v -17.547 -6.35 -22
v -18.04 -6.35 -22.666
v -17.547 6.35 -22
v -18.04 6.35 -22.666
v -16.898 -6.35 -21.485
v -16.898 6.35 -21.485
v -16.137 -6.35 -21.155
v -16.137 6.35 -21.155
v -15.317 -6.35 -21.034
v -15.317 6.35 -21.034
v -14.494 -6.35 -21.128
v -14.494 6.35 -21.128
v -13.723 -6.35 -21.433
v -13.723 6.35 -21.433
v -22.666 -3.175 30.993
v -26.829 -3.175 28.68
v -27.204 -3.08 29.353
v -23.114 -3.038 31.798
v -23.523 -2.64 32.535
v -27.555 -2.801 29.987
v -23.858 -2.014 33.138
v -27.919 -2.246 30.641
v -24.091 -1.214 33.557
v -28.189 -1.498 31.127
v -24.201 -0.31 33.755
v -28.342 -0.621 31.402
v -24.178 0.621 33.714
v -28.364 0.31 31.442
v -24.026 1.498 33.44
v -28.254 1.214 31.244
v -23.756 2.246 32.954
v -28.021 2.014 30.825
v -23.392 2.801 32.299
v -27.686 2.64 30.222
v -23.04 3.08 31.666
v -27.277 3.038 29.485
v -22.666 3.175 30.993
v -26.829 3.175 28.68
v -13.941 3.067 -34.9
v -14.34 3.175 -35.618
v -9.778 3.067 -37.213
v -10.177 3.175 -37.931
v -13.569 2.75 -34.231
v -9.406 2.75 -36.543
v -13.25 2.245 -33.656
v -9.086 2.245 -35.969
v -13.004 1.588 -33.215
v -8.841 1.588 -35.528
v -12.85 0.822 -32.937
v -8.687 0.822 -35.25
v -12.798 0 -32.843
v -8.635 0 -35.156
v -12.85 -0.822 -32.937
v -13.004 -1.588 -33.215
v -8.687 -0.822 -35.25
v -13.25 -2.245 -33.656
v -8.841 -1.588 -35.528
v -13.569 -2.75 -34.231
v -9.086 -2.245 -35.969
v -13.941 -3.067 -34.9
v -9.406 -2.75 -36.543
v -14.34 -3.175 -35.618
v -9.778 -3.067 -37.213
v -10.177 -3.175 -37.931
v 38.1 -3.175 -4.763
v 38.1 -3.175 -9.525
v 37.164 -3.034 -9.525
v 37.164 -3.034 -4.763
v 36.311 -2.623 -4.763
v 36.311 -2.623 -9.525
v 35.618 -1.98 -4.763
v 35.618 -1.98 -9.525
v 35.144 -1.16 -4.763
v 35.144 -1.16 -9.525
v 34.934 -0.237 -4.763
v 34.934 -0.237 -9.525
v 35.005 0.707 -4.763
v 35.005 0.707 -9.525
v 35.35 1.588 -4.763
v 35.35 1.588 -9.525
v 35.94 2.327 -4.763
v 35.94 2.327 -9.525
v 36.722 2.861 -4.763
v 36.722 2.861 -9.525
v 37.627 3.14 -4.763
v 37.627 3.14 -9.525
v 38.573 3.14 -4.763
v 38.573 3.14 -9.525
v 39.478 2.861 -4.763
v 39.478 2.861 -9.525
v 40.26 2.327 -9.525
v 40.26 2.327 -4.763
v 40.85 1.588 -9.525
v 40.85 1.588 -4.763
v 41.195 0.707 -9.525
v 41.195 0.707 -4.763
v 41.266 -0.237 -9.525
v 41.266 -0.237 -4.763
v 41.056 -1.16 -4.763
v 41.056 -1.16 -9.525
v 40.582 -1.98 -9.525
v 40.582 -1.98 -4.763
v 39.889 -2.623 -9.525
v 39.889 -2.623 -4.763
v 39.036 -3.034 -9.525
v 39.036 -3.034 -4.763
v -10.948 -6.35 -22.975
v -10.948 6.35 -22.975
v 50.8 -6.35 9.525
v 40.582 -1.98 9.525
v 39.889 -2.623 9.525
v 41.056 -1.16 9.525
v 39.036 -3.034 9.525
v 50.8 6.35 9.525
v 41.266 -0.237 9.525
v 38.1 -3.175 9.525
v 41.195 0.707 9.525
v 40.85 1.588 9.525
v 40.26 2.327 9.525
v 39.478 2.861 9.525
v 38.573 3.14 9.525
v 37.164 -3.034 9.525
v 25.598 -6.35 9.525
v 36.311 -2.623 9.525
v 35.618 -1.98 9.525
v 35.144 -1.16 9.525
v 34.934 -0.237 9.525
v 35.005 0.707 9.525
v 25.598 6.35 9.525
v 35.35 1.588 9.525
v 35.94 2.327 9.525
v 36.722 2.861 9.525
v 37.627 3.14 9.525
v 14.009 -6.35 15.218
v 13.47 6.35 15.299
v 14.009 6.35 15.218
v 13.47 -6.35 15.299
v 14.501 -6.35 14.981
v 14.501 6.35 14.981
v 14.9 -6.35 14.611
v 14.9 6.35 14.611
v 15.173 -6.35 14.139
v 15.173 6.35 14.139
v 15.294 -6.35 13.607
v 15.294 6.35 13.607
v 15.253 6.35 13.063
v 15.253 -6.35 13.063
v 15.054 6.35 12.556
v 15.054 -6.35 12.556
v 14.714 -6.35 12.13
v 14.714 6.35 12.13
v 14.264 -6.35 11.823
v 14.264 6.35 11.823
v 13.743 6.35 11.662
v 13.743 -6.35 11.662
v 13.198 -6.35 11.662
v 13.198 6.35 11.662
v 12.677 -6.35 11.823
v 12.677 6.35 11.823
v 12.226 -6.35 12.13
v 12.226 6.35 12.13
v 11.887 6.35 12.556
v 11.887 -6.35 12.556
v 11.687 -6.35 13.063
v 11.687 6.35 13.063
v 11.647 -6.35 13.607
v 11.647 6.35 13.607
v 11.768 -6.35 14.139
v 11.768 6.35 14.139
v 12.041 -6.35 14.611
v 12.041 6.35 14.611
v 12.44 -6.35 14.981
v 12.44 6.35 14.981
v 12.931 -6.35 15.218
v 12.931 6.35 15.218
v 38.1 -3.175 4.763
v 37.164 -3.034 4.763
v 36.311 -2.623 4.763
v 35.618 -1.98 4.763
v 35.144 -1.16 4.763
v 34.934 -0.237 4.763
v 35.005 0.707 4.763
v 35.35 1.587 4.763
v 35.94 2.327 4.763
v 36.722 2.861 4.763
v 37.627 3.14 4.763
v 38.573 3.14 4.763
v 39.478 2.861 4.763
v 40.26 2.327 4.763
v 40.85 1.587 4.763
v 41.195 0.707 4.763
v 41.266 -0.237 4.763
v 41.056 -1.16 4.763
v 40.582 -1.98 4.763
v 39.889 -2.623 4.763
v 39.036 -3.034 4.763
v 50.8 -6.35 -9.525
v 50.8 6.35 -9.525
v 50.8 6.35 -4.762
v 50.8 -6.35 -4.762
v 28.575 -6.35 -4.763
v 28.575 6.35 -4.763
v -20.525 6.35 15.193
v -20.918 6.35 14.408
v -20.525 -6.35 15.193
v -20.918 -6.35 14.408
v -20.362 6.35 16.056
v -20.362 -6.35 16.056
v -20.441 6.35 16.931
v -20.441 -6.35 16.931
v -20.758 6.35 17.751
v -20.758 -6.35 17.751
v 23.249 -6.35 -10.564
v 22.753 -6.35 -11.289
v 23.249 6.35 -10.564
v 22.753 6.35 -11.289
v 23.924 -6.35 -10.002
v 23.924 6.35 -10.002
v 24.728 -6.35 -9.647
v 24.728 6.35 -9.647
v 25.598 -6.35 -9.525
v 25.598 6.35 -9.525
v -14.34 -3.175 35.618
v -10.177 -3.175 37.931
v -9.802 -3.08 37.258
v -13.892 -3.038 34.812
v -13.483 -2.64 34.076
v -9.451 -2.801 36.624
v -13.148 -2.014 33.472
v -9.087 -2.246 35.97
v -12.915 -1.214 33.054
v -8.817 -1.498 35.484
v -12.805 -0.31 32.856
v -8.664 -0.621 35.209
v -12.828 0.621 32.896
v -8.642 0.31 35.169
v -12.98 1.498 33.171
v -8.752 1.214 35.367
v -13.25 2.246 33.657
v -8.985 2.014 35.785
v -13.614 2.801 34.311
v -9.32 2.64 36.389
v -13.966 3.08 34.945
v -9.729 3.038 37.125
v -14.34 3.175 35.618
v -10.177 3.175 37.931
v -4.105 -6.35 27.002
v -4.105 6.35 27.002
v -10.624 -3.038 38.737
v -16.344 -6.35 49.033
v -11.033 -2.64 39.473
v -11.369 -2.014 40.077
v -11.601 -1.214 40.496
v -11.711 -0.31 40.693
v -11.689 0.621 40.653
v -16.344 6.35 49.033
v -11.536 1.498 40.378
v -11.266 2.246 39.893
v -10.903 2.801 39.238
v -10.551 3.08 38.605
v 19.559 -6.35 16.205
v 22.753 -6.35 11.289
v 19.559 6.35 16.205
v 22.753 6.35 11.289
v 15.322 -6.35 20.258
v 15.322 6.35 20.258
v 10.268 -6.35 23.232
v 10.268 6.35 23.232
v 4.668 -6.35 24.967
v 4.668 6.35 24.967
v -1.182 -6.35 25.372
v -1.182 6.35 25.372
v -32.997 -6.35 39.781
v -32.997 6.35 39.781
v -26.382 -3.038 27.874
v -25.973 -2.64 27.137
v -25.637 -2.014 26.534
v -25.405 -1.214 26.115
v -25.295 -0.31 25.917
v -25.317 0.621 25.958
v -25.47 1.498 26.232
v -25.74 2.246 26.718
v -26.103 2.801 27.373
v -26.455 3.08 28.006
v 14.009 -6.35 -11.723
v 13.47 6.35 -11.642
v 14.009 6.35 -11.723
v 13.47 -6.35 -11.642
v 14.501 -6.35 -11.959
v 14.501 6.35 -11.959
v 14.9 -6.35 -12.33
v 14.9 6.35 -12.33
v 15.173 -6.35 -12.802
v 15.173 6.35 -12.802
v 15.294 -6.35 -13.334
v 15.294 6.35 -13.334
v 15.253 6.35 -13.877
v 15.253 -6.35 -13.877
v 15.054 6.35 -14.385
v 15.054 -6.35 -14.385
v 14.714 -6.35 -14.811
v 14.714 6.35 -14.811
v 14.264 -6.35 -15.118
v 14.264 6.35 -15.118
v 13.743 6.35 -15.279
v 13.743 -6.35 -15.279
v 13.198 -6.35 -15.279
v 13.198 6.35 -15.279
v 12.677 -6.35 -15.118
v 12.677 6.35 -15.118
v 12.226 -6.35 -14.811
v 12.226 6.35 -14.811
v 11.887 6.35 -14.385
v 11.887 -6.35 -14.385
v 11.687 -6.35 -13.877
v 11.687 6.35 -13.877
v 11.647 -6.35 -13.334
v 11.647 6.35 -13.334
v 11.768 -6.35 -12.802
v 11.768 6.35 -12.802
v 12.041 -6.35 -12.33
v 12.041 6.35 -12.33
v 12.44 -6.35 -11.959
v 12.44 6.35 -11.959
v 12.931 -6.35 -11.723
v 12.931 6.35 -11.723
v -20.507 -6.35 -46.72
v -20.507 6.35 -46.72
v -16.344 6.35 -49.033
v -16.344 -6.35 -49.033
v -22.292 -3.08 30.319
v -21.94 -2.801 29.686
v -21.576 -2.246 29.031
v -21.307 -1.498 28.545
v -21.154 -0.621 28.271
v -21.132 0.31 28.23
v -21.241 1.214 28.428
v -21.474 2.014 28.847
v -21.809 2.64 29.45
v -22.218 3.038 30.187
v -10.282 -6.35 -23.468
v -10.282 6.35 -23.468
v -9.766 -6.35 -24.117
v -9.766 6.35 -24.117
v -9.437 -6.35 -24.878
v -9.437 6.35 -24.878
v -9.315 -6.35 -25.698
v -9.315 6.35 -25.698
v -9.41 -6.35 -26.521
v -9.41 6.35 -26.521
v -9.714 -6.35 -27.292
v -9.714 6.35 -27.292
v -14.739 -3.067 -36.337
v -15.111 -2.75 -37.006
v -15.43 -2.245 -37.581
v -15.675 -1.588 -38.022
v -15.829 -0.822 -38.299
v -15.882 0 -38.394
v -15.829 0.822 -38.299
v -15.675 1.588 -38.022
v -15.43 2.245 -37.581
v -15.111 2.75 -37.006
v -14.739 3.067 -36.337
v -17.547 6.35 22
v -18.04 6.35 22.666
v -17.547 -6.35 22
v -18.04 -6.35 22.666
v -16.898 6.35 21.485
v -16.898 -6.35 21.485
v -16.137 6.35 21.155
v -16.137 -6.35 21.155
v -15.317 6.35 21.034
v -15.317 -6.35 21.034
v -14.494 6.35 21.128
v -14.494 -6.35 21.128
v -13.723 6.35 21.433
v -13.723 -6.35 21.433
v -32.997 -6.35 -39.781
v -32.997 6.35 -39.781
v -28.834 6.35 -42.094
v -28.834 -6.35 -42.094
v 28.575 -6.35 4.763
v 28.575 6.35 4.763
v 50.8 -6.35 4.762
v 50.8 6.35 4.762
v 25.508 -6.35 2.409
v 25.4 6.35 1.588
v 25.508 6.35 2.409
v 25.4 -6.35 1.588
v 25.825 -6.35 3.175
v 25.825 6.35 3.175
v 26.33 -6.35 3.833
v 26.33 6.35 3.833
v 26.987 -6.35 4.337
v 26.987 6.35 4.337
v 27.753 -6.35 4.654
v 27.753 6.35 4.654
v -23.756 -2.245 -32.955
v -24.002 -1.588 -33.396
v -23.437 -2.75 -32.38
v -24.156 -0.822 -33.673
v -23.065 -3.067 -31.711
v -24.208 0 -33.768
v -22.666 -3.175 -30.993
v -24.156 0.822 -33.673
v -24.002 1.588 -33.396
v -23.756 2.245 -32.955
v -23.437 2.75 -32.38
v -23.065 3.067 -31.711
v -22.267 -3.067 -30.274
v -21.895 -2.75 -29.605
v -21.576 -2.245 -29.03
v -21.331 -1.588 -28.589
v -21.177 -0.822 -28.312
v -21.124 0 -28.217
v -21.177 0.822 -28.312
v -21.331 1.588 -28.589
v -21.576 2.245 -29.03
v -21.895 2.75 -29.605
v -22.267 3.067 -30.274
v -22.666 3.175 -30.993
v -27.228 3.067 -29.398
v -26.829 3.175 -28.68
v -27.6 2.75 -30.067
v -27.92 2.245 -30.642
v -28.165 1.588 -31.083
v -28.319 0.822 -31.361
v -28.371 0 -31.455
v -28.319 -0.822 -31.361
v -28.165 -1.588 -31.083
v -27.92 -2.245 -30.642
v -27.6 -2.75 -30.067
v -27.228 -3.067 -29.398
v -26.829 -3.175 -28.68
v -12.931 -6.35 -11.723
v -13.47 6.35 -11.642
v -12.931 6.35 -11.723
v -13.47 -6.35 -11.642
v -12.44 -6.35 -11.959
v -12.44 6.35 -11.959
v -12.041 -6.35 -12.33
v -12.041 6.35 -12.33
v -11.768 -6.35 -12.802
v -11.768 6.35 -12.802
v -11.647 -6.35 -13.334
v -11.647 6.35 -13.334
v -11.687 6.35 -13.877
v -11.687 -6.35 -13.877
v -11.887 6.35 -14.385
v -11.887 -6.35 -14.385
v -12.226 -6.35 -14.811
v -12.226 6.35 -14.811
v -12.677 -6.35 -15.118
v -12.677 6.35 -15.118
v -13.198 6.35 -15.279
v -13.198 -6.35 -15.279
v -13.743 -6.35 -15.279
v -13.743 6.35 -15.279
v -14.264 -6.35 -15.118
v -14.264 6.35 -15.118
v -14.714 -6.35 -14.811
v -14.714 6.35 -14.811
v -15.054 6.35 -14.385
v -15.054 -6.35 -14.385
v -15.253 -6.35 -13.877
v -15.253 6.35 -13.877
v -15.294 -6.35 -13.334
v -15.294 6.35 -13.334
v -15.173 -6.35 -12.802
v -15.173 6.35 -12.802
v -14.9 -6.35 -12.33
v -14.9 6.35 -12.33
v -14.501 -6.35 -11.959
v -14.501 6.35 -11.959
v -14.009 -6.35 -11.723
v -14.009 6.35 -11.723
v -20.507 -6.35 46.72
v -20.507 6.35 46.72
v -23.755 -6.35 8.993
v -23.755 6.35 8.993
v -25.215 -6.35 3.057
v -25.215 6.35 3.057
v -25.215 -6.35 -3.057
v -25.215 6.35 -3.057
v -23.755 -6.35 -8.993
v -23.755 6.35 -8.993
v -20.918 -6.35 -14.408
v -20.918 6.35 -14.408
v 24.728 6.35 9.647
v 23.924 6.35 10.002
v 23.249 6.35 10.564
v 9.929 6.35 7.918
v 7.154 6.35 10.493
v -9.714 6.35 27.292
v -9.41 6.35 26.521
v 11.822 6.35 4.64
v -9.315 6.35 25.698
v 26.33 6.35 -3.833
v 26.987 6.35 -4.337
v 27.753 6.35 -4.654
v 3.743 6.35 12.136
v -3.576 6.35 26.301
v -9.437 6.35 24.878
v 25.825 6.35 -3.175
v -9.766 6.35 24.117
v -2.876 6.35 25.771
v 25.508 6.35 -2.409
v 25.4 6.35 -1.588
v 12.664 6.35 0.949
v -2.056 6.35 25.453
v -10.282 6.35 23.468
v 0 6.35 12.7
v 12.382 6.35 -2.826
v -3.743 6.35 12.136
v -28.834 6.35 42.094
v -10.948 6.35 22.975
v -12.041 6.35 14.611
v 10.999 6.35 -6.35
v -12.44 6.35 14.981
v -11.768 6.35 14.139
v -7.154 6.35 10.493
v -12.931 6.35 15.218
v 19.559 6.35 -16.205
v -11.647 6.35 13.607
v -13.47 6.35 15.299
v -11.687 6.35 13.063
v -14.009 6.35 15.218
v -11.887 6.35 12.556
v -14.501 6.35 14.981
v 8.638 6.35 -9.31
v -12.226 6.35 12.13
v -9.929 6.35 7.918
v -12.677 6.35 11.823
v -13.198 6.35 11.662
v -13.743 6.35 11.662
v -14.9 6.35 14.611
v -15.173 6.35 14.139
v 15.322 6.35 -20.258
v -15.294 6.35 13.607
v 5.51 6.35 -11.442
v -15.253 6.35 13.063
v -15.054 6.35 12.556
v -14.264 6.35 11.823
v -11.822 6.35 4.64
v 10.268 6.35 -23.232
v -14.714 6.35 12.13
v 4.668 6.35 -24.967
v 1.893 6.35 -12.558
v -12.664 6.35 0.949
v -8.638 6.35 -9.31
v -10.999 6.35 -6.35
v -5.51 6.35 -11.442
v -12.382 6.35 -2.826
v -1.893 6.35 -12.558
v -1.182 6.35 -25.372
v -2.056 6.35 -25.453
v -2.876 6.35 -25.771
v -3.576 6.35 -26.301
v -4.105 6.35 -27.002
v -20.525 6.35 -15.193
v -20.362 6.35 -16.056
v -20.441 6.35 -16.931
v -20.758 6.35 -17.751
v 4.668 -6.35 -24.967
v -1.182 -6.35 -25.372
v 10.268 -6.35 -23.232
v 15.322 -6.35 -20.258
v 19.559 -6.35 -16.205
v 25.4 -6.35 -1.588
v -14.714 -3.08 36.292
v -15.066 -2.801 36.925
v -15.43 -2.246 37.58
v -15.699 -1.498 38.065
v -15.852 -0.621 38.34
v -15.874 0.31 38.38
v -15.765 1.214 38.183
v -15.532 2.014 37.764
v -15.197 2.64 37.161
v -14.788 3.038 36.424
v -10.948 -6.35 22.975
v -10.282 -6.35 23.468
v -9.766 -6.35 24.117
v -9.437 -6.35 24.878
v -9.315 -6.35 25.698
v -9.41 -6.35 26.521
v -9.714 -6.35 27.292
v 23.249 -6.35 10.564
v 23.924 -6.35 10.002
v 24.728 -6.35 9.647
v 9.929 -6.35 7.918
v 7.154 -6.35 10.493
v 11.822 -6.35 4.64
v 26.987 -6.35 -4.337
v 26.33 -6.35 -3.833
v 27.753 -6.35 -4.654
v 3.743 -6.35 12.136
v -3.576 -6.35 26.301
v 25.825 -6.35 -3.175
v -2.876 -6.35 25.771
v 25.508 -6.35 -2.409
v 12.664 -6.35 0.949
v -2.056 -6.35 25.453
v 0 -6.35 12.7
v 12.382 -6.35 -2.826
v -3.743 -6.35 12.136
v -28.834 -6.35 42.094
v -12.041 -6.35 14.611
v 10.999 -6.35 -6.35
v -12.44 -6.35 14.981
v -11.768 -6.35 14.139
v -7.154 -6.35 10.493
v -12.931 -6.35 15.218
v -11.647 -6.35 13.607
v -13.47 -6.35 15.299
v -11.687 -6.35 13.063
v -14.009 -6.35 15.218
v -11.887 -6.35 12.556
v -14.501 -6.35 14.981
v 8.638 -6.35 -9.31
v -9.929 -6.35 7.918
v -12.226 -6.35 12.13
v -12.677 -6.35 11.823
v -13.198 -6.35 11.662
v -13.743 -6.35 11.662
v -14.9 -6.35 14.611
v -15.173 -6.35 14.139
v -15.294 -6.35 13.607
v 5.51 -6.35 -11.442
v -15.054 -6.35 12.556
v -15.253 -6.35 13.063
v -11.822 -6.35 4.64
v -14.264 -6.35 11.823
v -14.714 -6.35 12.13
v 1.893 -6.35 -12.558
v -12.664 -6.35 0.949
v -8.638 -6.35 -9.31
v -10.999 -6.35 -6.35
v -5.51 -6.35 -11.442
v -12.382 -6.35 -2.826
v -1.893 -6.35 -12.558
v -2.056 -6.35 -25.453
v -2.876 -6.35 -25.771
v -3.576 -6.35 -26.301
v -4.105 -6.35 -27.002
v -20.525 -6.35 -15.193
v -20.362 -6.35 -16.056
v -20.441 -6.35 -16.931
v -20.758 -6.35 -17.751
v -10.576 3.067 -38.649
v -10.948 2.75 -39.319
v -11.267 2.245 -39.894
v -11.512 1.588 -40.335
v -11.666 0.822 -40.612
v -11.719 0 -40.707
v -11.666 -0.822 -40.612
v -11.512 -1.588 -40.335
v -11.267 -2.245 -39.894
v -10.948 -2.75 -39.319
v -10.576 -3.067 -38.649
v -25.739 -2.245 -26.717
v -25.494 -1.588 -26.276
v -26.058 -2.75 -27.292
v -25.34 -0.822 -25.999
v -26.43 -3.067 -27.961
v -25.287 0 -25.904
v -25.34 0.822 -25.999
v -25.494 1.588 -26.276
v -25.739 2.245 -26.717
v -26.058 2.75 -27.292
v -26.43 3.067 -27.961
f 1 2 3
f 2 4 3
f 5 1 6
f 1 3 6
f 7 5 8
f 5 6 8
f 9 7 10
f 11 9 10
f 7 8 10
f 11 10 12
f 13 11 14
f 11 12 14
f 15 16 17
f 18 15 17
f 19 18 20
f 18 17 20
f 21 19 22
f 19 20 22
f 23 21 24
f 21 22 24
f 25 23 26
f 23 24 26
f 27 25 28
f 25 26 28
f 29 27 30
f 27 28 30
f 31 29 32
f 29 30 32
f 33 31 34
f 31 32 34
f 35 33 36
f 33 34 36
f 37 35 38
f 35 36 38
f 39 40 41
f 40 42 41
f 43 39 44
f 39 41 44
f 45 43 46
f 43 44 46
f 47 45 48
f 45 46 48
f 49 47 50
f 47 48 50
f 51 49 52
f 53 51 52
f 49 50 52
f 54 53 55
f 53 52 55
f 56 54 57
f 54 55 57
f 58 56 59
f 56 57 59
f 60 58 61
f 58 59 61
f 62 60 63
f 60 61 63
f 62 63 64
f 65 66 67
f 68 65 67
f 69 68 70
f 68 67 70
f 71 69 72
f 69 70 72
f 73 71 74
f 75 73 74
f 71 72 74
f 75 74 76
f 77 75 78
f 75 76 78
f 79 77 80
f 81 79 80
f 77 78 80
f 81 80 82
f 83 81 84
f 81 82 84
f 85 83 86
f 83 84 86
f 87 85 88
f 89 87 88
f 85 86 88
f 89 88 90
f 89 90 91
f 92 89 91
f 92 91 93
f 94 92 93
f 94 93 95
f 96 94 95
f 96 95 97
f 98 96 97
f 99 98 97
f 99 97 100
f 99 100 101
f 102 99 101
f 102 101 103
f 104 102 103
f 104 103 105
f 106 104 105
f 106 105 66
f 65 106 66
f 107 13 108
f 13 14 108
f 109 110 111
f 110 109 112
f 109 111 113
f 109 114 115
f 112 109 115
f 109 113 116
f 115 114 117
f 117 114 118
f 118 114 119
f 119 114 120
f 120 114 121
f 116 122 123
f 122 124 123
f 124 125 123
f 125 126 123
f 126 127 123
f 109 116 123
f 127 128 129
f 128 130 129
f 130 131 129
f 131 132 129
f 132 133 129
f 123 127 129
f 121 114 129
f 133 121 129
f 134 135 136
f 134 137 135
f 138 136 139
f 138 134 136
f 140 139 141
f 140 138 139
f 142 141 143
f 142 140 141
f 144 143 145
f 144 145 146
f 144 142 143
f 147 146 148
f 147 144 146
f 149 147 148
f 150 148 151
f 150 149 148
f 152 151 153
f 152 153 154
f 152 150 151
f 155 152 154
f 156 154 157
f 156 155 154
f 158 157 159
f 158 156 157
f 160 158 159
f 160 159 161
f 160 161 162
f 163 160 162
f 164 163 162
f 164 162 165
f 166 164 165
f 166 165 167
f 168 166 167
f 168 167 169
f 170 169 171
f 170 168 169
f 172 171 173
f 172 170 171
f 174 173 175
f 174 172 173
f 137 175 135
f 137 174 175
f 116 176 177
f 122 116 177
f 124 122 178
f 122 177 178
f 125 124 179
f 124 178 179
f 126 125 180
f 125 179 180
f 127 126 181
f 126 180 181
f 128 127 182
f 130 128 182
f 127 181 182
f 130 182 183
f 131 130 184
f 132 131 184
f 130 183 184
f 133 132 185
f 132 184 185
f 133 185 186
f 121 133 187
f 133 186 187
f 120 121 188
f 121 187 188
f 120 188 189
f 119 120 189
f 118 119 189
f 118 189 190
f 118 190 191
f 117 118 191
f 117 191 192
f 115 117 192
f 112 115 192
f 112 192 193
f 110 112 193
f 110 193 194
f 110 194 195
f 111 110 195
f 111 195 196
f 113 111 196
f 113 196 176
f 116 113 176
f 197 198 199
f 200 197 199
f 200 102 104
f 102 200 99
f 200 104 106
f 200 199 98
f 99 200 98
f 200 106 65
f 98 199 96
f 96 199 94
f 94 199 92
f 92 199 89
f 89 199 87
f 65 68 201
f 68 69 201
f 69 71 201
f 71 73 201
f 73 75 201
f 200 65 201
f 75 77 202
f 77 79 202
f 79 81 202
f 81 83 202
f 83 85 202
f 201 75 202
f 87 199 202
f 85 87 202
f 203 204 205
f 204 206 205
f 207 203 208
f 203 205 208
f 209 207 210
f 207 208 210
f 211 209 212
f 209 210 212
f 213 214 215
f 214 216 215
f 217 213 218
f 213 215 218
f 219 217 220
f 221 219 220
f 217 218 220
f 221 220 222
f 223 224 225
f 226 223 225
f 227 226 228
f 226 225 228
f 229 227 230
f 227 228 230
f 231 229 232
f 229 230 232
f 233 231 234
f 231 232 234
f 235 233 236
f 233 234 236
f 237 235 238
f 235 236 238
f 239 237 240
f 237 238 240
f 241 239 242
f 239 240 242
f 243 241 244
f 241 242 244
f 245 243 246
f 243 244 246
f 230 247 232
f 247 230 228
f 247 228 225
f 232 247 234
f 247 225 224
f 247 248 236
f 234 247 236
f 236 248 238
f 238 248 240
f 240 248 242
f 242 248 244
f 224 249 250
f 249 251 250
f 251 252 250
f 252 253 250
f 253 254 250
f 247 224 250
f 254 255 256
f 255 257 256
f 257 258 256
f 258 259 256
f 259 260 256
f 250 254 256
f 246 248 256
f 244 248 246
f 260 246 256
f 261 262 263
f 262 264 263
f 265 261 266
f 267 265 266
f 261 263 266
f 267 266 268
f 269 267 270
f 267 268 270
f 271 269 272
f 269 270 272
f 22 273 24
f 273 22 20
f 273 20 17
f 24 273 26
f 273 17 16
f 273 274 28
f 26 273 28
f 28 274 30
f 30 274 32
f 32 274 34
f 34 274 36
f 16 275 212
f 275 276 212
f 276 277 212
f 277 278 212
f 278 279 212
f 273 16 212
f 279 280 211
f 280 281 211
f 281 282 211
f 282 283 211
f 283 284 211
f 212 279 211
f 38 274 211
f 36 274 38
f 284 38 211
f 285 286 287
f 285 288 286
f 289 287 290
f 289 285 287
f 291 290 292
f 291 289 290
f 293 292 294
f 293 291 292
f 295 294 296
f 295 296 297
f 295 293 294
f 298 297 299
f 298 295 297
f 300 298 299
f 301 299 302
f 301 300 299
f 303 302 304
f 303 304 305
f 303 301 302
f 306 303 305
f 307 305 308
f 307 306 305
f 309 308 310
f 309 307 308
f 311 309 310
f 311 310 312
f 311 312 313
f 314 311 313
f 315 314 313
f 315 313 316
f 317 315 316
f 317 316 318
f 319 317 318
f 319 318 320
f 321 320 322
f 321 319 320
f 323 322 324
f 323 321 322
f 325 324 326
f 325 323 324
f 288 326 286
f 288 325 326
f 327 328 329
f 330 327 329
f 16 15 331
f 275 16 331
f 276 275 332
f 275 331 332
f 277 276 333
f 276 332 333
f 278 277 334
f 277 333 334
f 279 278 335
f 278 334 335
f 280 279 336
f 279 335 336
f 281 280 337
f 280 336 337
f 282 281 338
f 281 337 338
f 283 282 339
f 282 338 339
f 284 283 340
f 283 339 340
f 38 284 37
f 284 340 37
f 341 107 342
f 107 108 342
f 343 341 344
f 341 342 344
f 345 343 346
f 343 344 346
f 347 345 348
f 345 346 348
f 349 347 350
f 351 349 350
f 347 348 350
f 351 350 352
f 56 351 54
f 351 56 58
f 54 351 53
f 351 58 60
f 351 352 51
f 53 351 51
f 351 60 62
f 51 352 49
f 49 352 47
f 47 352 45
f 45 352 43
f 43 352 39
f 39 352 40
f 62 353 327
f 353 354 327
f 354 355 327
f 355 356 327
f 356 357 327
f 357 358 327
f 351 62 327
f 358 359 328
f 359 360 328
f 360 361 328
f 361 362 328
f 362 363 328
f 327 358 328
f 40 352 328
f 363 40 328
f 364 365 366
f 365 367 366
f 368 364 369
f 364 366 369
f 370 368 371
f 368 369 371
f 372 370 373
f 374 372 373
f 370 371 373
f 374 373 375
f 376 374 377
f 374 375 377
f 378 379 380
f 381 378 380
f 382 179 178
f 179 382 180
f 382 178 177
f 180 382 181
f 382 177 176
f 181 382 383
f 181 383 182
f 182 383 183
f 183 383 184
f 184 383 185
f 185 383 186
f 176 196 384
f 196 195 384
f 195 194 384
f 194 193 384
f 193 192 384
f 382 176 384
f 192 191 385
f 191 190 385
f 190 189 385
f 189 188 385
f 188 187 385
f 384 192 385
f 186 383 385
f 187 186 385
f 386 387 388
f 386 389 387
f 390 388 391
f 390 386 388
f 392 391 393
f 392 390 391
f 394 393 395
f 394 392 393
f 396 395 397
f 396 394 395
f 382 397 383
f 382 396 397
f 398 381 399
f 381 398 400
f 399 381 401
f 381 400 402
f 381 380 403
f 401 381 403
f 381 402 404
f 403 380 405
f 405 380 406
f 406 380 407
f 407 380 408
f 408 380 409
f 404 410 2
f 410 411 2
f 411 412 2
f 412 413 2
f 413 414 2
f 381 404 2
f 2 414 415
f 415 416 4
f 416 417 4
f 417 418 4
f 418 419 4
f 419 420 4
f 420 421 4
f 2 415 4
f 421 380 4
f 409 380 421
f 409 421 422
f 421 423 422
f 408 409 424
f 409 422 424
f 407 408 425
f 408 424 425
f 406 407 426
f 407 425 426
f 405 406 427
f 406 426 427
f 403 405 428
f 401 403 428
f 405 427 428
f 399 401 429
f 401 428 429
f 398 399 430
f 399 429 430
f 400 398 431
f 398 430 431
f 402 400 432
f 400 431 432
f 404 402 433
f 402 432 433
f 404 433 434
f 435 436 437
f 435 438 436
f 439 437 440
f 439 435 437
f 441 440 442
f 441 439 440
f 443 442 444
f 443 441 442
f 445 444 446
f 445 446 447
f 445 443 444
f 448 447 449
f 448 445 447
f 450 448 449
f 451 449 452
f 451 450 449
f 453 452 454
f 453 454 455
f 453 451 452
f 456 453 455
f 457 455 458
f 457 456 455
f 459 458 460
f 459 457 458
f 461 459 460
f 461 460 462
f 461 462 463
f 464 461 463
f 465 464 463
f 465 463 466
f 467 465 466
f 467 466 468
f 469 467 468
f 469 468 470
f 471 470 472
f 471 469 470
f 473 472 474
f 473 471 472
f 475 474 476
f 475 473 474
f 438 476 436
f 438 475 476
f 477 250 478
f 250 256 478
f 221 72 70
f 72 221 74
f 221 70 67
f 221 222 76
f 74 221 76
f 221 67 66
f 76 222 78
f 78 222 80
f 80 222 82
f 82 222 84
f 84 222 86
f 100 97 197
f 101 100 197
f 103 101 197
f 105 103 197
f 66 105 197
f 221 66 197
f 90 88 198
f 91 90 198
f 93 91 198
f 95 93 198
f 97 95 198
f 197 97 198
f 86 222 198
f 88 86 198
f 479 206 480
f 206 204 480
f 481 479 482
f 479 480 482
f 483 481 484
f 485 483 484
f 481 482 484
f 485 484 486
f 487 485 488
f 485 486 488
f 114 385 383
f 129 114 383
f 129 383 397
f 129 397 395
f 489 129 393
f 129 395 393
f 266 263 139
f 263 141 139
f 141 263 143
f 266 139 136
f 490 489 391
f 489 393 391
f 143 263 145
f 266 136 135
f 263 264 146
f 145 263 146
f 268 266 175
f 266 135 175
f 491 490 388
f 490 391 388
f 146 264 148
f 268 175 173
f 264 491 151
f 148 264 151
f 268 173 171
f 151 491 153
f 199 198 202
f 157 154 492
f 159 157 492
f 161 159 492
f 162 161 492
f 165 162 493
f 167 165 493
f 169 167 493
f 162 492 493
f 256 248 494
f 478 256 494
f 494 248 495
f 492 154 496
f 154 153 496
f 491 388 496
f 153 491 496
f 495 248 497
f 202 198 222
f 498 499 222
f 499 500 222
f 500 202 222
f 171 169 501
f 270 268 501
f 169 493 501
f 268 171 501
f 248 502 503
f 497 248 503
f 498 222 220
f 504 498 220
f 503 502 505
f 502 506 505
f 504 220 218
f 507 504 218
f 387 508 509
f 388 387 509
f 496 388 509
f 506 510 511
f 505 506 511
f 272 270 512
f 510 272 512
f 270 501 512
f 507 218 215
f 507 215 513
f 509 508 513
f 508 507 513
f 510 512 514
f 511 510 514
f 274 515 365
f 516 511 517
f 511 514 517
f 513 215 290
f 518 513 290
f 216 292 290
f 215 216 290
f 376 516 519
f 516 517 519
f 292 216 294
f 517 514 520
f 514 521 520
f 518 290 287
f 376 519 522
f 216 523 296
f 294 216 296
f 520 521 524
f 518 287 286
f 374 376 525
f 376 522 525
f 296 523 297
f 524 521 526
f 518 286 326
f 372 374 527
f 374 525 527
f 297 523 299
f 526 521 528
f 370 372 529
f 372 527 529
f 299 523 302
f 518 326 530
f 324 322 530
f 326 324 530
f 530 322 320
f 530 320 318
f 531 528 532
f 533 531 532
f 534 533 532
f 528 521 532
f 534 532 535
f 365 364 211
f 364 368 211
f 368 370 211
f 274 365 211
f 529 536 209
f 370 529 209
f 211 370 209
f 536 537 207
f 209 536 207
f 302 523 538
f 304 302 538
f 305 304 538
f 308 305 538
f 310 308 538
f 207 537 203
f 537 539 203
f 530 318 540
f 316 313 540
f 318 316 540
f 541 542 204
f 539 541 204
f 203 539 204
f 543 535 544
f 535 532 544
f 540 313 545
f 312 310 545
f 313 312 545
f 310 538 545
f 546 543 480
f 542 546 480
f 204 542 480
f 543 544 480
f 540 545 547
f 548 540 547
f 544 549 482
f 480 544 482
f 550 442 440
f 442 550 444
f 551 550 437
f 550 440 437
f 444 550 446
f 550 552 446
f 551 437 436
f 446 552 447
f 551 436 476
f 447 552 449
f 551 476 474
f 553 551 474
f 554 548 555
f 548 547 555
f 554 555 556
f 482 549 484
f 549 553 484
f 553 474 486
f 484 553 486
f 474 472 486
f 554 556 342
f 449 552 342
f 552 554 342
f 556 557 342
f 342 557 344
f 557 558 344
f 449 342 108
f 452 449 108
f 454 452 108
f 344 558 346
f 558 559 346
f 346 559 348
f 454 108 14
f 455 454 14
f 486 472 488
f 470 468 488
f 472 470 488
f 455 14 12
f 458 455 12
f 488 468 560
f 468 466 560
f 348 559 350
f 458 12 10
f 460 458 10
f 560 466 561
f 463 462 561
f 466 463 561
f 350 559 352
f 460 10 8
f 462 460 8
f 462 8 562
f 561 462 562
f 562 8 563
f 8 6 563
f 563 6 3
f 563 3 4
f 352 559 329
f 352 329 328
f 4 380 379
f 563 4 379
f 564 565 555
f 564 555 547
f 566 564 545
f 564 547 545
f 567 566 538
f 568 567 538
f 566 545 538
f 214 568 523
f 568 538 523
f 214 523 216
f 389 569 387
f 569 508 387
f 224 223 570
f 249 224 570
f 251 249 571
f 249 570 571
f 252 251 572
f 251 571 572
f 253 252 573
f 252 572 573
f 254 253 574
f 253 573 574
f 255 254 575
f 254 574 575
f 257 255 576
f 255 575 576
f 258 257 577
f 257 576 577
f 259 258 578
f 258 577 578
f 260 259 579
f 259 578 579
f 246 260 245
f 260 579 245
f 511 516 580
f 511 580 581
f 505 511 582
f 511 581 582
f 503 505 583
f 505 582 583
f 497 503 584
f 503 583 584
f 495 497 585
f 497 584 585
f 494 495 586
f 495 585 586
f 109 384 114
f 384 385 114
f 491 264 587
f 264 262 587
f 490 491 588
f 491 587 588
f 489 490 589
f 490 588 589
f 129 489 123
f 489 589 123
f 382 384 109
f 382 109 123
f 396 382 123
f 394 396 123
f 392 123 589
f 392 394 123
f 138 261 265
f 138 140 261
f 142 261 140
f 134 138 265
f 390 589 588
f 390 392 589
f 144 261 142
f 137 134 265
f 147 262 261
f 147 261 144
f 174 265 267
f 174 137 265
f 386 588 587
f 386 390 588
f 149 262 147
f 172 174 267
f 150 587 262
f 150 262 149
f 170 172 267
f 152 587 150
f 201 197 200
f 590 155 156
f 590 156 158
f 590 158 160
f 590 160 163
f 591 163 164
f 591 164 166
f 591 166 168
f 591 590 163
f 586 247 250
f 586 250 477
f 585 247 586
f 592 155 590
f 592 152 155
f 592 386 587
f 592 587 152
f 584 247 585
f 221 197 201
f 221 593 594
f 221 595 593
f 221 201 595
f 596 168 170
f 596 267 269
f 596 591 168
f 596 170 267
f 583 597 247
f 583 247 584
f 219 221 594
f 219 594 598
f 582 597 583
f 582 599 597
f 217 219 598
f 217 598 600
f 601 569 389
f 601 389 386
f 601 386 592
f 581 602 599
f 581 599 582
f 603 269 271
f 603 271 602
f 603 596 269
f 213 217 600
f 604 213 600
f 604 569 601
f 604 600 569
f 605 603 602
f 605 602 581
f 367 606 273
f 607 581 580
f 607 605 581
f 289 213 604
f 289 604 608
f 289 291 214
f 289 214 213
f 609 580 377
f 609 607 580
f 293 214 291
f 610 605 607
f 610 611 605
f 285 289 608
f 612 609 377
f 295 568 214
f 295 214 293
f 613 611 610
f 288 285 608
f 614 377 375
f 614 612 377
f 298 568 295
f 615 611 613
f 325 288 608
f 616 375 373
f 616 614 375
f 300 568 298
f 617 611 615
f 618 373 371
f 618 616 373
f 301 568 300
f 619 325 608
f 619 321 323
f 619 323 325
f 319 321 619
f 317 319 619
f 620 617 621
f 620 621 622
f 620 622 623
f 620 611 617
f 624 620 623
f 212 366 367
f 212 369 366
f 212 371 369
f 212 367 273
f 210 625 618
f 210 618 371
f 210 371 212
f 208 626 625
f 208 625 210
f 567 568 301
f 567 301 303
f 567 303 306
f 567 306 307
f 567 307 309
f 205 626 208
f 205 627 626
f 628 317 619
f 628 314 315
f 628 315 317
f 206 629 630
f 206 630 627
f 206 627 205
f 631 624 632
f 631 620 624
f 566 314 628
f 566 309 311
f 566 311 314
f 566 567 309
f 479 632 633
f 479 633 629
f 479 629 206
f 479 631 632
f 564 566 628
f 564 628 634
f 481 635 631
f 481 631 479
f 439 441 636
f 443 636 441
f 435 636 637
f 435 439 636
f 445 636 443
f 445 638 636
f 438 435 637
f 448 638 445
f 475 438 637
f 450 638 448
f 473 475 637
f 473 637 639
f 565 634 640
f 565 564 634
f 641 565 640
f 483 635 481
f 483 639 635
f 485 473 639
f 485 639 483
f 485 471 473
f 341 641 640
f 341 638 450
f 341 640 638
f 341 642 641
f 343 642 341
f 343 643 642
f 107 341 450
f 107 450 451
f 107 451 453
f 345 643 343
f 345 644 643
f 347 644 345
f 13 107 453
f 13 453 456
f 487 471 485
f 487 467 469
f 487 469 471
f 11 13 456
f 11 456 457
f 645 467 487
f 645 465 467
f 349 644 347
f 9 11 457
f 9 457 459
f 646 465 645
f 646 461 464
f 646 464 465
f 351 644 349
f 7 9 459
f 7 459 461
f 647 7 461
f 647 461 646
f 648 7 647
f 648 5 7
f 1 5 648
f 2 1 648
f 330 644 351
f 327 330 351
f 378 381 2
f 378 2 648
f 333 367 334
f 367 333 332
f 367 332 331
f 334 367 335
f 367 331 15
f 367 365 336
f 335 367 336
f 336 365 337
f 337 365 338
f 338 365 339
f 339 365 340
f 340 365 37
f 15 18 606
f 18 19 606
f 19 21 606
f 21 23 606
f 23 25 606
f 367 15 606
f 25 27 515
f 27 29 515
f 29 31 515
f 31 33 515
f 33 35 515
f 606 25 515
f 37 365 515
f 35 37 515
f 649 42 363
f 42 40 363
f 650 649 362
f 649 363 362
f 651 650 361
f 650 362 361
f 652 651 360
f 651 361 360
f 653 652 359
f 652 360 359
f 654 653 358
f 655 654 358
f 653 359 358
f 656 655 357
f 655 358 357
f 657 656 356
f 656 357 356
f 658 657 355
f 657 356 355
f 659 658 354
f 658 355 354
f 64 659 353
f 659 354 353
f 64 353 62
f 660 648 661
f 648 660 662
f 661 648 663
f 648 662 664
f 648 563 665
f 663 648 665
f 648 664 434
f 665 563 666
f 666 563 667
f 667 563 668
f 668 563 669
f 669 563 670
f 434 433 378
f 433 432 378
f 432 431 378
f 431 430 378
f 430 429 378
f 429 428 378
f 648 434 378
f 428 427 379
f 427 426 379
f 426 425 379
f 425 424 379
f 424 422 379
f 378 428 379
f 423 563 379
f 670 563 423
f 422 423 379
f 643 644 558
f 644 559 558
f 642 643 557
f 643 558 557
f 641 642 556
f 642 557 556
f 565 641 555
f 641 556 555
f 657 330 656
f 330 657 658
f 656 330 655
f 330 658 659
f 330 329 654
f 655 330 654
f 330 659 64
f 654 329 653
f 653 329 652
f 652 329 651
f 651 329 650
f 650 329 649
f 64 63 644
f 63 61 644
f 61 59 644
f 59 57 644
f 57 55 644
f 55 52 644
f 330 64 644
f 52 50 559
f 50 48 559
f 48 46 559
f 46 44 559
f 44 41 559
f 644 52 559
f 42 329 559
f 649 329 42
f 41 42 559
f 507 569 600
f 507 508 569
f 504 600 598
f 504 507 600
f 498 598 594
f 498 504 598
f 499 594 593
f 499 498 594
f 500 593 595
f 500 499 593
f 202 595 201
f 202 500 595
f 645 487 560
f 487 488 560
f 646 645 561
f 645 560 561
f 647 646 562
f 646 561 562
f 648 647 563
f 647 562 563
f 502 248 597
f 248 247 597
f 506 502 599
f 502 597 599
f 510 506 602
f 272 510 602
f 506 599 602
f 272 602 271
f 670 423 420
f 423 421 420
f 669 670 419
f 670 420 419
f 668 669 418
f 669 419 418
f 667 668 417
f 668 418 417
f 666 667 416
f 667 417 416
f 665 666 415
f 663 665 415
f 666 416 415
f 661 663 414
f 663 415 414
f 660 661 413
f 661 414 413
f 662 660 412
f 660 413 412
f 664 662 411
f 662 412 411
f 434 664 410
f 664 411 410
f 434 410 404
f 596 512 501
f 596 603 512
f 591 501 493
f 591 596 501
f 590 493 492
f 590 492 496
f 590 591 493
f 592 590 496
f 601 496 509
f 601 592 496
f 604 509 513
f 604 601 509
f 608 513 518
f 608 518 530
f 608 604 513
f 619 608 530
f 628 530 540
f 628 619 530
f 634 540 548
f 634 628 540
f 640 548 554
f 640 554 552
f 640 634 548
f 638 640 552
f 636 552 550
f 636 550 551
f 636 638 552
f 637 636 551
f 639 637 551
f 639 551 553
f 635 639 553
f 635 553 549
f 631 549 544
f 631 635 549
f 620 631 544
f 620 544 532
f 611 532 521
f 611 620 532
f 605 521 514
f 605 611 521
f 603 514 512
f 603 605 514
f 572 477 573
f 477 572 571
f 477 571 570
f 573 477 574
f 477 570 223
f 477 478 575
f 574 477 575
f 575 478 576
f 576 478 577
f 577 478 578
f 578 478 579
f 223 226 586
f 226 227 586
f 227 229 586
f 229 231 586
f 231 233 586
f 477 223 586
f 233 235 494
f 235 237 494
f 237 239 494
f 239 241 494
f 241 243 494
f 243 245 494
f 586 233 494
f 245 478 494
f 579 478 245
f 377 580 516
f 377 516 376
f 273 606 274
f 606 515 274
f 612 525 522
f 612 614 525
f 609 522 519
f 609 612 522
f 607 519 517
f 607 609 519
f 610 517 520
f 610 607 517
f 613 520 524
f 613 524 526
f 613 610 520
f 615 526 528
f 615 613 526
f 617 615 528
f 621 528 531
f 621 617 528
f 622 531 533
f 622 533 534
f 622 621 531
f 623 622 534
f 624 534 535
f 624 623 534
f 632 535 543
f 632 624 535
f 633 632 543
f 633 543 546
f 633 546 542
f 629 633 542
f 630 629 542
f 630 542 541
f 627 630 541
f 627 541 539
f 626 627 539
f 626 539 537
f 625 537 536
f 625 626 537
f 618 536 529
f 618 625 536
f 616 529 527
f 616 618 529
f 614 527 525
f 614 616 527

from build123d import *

# Parameters (mm, degrees)
SKETCH1_R                             = 12.7
SKETCH1_R_2                           = 1.8288
BOSS_EXTRUDE1_DEPTH                   = 6.35
F_1_4_0_25_DIAMETER_HOLE1_D           = 6.35
F_1_4_0_25_DIAMETER_HOLE1_ON_FACE_2_D = 6.35
F_1_4_0_25_DIAMETER_HOLE1_ON_FACE_3_D = 6.35
F_1_4_0_25_DIAMETER_HOLE1_ON_FACE_4_D = 6.35
F_1_4_0_25_DIAMETER_HOLE1_ON_FACE_5_D = 6.35
F_1_4_0_25_DIAMETER_HOLE1_ON_FACE_6_D = 6.35
FILLET1_R                             = 3.175


with BuildPart() as part:
    # Sketch1 → Boss-Extrude1 (new, symmetric)
    with BuildSketch(Plane(origin=(0, 0, 0), x_dir=(1, 0, 0), z_dir=(0, 1, 0))):
        with BuildLine():
            Line((25.4, 4.7625), (25.4, -4.7625))
            Line((25.4, -4.7625), (50.8, -4.7625))
            Line((50.8, -4.7625), (50.8, -9.525))
            Line((50.8, -9.525), (23.546430197, -9.525))
            ThreePointArc((23.546430197, -9.525), (12.881044339, -21.891521115), (-3.108809324, -25.209032202))
            Line((-3.108809324, -25.209032202), (-16.344312849, -49.032938546))
            Line((-16.344312849, -49.032938546), (-20.507486876, -46.720064087))
            Line((-20.507486876, -46.720064087), (-8.172156424, -24.516469273))
            Line((-8.172156424, -24.516469273), (-16.498504479, -19.890720354))
            Line((-16.498504479, -19.890720354), (-28.833834931, -42.094315167))
            Line((-28.833834931, -42.094315167), (-32.997008959, -39.781440707))
            Line((-32.997008959, -39.781440707), (-19.761505434, -15.957534364))
            ThreePointArc((-19.761505434, -15.957534364), (-25.4, 0), (-19.761505434, 15.957534364))
            Line((-19.761505434, 15.957534364), (-32.997008959, 39.781440707))
            Line((-32.997008959, 39.781440707), (-28.833834931, 42.094315167))
            Line((-28.833834931, 42.094315167), (-16.498504479, 19.890720354))
            Line((-16.498504479, 19.890720354), (-8.172156424, 24.516469273))
            Line((-8.172156424, 24.516469273), (-20.507486876, 46.720064087))
            Line((-20.507486876, 46.720064087), (-16.344312849, 49.032938546))
            Line((-16.344312849, 49.032938546), (-3.108809324, 25.209032202))
            ThreePointArc((-3.108809324, 25.209032202), (12.881044339, 21.891521115), (23.546430197, 9.525))
            Line((23.546430197, 9.525), (50.8, 9.525))
            Line((50.8, 9.525), (50.8, 4.7625))
            Line((50.8, 4.7625), (25.4, 4.7625))
        make_face()
        with Locations(Location((0, 0, 0), (0, 0, 270))):
            Circle(SKETCH1_R, mode=Mode.SUBTRACT)
        with Locations(Location((-13.470384182, 13.470384182, 0), (0, 0, 270))):
            Circle(SKETCH1_R_2, mode=Mode.SUBTRACT)
        with Locations(Location((13.470384182, 13.470384182, 0), (0, 0, 270))):
            Circle(SKETCH1_R_2, mode=Mode.SUBTRACT)
        with Locations(Location((13.470384182, -13.470384182, 0), (0, 0, 270))):
            Circle(SKETCH1_R_2, mode=Mode.SUBTRACT)
        with Locations(Location((-13.470384182, -13.470384182, 0), (0, 0, 270))):
            Circle(SKETCH1_R_2, mode=Mode.SUBTRACT)
    extrude(amount=BOSS_EXTRUDE1_DEPTH, both=True)

    # 1/4 (0.25) Diameter Hole1 (through all)
    with Locations(Plane(origin=(38.1, 0, -4.7625), x_dir=(0, 1, 0), z_dir=(0, 0, 1))):
        with Locations((0, 0)):
            Hole(F_1_4_0_25_DIAMETER_HOLE1_D / 2)

    # 1/4 (0.25) Diameter Hole1 on face 2 (through all)
    with Locations(Plane(origin=(-14.33982165, 0, -35.61826668), x_dir=(-0.48564310099, 0, -0.874157181782), z_dir=(-0.874157181782, 0, 0.48564310099))):
        with Locations((0, 0)):
            Hole(F_1_4_0_25_DIAMETER_HOLE1_ON_FACE_2_D / 2)

    # 1/4 (0.25) Diameter Hole1 on face 3 (through all)
    with Locations(Plane(origin=(-22.666169705, 0, 30.99251776), x_dir=(-0.48564310099, 0, 0.874157181782), z_dir=(0.874157181782, 0, 0.48564310099))):
        with Locations((1e-09, 0)):
            Hole(F_1_4_0_25_DIAMETER_HOLE1_ON_FACE_3_D / 2)

    # 1/4 (0.25) Diameter Hole1 on face 4 (through all)
    with Locations(Plane(origin=(-14.33982165, 0, 35.61826668), x_dir=(0.48564310099, 0, -0.874157181782), z_dir=(-0.874157181782, 0, -0.48564310099))):
        with Locations((0, 0)):
            Hole(F_1_4_0_25_DIAMETER_HOLE1_ON_FACE_4_D / 2)

    # 1/4 (0.25) Diameter Hole1 on face 5 (through all)
    with Locations(Plane(origin=(-22.666169705, 0, -30.99251776), x_dir=(0.48564310099, 0, 0.874157181782), z_dir=(0.874157181782, 0, -0.48564310099))):
        with Locations((-1e-09, 0)):
            Hole(F_1_4_0_25_DIAMETER_HOLE1_ON_FACE_5_D / 2)

    # 1/4 (0.25) Diameter Hole1 on face 6 (through all)
    with Locations(Plane(origin=(38.1, 0, 4.7625), x_dir=(-1, 0, 0), z_dir=(0, 0, -1))):
        with Locations((0, 0)):
            Hole(F_1_4_0_25_DIAMETER_HOLE1_ON_FACE_6_D / 2)

    # Fillet1
    fillet1_edges = [part.edges().sort_by_distance(p)[0] for p in [
        (25.4, 0, -4.7625),
        (25.4, 0, 4.7625),
        (23.546430197, 0, 9.525),
        (-3.108809324, 0, 25.209032202),
        (-8.172156424, 0, 24.516469273),
        (-16.498504479, 0, 19.890720354),
        (-19.761505434, 0, 15.957534364),
        (-19.761505434, 0, -15.957534364),
        (-16.498504479, 0, -19.890720354),
        (-8.172156424, 0, -24.516469273),
        (-3.108809324, 0, -25.209032202),
        (23.546430197, 0, -9.525),
    ]]
    fillet(fillet1_edges, radius=FILLET1_R)


solid = part.part
